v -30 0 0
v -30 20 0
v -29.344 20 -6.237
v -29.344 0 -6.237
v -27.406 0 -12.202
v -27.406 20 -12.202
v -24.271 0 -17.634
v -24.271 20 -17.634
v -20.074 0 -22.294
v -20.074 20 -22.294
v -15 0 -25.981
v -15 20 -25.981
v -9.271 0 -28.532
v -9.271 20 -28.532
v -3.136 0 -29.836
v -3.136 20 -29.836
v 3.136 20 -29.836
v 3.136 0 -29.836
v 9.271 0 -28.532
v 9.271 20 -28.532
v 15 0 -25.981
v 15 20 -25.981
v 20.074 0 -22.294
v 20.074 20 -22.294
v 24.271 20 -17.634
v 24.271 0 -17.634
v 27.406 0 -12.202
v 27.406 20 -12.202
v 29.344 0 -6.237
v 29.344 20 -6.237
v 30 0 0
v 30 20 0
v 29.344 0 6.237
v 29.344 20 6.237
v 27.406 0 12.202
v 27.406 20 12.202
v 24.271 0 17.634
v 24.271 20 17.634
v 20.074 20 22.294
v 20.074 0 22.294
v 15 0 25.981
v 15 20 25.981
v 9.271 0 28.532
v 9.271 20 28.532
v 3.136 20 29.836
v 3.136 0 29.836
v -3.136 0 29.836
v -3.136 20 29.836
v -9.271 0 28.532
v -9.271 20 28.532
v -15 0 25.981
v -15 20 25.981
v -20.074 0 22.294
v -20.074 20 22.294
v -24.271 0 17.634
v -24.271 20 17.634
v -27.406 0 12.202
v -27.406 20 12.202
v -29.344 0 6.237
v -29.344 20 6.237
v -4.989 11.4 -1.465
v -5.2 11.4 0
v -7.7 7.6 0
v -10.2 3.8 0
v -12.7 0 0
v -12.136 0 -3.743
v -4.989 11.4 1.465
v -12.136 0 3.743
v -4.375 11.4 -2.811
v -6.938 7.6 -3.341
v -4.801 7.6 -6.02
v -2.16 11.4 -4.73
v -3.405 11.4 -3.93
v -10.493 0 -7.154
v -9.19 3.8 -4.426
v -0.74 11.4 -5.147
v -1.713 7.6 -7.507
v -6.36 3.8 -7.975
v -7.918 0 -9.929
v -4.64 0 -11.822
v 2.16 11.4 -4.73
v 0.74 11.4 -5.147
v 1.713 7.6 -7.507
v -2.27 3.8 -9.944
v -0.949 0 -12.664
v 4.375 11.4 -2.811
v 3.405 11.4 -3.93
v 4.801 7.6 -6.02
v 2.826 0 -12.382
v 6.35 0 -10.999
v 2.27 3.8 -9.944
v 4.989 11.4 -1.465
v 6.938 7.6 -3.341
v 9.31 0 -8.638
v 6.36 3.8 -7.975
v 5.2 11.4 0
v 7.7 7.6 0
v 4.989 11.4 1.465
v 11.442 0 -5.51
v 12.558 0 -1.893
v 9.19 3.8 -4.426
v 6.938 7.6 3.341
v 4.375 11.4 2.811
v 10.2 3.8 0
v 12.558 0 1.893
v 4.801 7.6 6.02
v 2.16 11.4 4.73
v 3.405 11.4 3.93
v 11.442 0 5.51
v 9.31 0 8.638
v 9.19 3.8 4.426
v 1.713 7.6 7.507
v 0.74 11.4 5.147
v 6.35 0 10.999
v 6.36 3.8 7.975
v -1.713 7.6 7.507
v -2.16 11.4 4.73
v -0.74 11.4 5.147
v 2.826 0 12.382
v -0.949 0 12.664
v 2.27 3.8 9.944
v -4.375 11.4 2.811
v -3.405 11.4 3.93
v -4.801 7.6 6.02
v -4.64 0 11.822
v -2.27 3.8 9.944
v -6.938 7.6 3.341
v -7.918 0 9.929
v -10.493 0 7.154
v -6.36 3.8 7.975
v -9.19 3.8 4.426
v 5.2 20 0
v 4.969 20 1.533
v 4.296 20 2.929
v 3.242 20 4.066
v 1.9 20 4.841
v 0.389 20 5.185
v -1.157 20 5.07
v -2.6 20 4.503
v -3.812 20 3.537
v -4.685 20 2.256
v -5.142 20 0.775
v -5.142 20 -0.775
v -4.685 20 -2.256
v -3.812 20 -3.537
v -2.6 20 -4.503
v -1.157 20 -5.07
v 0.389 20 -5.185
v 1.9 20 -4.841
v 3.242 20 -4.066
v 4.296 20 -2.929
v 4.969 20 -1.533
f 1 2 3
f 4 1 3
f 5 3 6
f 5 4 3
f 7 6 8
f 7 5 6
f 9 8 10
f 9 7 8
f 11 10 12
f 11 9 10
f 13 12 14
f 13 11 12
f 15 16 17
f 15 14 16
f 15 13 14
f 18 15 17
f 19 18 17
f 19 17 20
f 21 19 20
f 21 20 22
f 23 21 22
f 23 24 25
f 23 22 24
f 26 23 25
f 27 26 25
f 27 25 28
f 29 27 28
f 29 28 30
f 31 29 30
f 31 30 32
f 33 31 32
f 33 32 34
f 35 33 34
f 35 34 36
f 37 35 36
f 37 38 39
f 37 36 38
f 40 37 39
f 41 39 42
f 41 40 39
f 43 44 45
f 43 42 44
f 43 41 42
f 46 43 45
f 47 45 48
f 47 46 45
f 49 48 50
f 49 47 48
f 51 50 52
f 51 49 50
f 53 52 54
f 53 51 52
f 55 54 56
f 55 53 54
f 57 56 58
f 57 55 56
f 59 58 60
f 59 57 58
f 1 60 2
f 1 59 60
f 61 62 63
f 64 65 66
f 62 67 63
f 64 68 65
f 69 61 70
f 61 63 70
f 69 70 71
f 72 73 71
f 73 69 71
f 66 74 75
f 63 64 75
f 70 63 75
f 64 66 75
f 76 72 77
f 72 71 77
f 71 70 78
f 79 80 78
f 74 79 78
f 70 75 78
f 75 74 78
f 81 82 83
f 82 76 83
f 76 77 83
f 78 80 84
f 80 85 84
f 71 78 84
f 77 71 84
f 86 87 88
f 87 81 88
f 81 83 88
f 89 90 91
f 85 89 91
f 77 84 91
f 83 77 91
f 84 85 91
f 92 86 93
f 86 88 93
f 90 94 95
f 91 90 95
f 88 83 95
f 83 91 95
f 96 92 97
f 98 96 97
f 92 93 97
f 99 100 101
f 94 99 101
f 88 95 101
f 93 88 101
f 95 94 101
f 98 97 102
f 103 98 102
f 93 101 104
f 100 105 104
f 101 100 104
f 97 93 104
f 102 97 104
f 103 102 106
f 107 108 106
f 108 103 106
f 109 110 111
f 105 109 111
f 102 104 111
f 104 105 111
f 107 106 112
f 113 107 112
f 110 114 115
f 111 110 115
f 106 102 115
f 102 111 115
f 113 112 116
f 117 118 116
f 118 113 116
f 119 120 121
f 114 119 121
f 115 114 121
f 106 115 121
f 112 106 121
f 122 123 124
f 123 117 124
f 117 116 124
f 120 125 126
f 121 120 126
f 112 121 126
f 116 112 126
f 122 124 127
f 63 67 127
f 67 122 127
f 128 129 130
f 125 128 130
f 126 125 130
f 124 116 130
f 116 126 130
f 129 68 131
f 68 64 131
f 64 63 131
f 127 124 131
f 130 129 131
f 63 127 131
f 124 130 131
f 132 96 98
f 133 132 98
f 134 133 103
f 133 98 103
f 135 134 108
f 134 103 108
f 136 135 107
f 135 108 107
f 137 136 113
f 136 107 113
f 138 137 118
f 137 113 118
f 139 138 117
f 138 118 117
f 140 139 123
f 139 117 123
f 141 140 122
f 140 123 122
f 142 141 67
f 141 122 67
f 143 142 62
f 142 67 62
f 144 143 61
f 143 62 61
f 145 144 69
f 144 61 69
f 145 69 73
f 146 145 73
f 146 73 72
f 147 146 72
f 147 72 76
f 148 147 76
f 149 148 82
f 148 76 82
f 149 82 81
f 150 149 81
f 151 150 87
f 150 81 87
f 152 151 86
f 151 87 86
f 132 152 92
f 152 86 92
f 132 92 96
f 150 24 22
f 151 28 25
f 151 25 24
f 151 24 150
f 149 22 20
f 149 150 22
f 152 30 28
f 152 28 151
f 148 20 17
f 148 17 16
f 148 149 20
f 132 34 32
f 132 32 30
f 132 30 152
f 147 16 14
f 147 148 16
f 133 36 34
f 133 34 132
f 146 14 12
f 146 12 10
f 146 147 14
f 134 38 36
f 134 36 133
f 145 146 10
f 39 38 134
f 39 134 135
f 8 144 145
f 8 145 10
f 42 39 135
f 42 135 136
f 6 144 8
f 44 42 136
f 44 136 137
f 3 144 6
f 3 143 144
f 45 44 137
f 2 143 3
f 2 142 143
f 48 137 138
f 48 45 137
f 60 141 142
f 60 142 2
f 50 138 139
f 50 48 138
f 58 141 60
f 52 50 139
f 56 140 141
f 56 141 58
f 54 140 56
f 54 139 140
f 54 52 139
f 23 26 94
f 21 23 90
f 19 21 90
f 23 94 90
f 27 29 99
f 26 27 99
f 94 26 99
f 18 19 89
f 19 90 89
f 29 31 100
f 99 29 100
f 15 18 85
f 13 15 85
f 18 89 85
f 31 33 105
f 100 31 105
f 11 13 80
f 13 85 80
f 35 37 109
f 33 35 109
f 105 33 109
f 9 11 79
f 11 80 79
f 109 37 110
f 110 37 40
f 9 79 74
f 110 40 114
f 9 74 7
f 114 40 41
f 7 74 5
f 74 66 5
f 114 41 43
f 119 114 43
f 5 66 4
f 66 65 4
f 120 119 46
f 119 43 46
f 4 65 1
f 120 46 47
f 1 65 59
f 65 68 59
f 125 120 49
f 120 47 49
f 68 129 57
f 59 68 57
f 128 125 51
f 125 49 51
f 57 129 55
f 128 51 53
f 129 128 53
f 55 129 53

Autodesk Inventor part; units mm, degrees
ref_plane "YZ Plane" through (0, 0, 0) normal (1, 0, 0) x (0, 1, 0)
ref_plane "XZ Plane" through (0, 0, 0) normal (0, 1, 0) x (-1, 0, 0)
ref_plane "XY Plane" through (0, 0, 0) normal (0, 0, 1) x (1, 0, 0)
sketch "Sketch1" plane through (0, 0, 0) normal (0, 1, 0) x (-1, 0, 0)
  circle A0 centre (0, 0) radius 30
  circle A1 centre (0, 0) radius 12.7
  dimension "d1" = 60
  dimension "d14" = 25.4
extrude "Extrusion1" add sketch "Sketch1" along normal blind 20 contours A0 | A1
extrude "Extrusion2" cut sketch "Sketch1" along normal blind 11.4 contours A1
chamfer "Chamfer2" distance 11.4 distance2 7.5 1 edges at (12.7, 11.4, 0) measured on face at (-12.5355, 7.6, -2.0372)
sketch "Sketch2" plane through (0, 11.4, 0) normal (0, -1, 0) x (1, 0, 0)
  circle A0 centre (0, 0) radius 5.2
extrude "Extrusion3" cut sketch "Sketch2" against normal blind 11.4
properties part number "1. ring"
